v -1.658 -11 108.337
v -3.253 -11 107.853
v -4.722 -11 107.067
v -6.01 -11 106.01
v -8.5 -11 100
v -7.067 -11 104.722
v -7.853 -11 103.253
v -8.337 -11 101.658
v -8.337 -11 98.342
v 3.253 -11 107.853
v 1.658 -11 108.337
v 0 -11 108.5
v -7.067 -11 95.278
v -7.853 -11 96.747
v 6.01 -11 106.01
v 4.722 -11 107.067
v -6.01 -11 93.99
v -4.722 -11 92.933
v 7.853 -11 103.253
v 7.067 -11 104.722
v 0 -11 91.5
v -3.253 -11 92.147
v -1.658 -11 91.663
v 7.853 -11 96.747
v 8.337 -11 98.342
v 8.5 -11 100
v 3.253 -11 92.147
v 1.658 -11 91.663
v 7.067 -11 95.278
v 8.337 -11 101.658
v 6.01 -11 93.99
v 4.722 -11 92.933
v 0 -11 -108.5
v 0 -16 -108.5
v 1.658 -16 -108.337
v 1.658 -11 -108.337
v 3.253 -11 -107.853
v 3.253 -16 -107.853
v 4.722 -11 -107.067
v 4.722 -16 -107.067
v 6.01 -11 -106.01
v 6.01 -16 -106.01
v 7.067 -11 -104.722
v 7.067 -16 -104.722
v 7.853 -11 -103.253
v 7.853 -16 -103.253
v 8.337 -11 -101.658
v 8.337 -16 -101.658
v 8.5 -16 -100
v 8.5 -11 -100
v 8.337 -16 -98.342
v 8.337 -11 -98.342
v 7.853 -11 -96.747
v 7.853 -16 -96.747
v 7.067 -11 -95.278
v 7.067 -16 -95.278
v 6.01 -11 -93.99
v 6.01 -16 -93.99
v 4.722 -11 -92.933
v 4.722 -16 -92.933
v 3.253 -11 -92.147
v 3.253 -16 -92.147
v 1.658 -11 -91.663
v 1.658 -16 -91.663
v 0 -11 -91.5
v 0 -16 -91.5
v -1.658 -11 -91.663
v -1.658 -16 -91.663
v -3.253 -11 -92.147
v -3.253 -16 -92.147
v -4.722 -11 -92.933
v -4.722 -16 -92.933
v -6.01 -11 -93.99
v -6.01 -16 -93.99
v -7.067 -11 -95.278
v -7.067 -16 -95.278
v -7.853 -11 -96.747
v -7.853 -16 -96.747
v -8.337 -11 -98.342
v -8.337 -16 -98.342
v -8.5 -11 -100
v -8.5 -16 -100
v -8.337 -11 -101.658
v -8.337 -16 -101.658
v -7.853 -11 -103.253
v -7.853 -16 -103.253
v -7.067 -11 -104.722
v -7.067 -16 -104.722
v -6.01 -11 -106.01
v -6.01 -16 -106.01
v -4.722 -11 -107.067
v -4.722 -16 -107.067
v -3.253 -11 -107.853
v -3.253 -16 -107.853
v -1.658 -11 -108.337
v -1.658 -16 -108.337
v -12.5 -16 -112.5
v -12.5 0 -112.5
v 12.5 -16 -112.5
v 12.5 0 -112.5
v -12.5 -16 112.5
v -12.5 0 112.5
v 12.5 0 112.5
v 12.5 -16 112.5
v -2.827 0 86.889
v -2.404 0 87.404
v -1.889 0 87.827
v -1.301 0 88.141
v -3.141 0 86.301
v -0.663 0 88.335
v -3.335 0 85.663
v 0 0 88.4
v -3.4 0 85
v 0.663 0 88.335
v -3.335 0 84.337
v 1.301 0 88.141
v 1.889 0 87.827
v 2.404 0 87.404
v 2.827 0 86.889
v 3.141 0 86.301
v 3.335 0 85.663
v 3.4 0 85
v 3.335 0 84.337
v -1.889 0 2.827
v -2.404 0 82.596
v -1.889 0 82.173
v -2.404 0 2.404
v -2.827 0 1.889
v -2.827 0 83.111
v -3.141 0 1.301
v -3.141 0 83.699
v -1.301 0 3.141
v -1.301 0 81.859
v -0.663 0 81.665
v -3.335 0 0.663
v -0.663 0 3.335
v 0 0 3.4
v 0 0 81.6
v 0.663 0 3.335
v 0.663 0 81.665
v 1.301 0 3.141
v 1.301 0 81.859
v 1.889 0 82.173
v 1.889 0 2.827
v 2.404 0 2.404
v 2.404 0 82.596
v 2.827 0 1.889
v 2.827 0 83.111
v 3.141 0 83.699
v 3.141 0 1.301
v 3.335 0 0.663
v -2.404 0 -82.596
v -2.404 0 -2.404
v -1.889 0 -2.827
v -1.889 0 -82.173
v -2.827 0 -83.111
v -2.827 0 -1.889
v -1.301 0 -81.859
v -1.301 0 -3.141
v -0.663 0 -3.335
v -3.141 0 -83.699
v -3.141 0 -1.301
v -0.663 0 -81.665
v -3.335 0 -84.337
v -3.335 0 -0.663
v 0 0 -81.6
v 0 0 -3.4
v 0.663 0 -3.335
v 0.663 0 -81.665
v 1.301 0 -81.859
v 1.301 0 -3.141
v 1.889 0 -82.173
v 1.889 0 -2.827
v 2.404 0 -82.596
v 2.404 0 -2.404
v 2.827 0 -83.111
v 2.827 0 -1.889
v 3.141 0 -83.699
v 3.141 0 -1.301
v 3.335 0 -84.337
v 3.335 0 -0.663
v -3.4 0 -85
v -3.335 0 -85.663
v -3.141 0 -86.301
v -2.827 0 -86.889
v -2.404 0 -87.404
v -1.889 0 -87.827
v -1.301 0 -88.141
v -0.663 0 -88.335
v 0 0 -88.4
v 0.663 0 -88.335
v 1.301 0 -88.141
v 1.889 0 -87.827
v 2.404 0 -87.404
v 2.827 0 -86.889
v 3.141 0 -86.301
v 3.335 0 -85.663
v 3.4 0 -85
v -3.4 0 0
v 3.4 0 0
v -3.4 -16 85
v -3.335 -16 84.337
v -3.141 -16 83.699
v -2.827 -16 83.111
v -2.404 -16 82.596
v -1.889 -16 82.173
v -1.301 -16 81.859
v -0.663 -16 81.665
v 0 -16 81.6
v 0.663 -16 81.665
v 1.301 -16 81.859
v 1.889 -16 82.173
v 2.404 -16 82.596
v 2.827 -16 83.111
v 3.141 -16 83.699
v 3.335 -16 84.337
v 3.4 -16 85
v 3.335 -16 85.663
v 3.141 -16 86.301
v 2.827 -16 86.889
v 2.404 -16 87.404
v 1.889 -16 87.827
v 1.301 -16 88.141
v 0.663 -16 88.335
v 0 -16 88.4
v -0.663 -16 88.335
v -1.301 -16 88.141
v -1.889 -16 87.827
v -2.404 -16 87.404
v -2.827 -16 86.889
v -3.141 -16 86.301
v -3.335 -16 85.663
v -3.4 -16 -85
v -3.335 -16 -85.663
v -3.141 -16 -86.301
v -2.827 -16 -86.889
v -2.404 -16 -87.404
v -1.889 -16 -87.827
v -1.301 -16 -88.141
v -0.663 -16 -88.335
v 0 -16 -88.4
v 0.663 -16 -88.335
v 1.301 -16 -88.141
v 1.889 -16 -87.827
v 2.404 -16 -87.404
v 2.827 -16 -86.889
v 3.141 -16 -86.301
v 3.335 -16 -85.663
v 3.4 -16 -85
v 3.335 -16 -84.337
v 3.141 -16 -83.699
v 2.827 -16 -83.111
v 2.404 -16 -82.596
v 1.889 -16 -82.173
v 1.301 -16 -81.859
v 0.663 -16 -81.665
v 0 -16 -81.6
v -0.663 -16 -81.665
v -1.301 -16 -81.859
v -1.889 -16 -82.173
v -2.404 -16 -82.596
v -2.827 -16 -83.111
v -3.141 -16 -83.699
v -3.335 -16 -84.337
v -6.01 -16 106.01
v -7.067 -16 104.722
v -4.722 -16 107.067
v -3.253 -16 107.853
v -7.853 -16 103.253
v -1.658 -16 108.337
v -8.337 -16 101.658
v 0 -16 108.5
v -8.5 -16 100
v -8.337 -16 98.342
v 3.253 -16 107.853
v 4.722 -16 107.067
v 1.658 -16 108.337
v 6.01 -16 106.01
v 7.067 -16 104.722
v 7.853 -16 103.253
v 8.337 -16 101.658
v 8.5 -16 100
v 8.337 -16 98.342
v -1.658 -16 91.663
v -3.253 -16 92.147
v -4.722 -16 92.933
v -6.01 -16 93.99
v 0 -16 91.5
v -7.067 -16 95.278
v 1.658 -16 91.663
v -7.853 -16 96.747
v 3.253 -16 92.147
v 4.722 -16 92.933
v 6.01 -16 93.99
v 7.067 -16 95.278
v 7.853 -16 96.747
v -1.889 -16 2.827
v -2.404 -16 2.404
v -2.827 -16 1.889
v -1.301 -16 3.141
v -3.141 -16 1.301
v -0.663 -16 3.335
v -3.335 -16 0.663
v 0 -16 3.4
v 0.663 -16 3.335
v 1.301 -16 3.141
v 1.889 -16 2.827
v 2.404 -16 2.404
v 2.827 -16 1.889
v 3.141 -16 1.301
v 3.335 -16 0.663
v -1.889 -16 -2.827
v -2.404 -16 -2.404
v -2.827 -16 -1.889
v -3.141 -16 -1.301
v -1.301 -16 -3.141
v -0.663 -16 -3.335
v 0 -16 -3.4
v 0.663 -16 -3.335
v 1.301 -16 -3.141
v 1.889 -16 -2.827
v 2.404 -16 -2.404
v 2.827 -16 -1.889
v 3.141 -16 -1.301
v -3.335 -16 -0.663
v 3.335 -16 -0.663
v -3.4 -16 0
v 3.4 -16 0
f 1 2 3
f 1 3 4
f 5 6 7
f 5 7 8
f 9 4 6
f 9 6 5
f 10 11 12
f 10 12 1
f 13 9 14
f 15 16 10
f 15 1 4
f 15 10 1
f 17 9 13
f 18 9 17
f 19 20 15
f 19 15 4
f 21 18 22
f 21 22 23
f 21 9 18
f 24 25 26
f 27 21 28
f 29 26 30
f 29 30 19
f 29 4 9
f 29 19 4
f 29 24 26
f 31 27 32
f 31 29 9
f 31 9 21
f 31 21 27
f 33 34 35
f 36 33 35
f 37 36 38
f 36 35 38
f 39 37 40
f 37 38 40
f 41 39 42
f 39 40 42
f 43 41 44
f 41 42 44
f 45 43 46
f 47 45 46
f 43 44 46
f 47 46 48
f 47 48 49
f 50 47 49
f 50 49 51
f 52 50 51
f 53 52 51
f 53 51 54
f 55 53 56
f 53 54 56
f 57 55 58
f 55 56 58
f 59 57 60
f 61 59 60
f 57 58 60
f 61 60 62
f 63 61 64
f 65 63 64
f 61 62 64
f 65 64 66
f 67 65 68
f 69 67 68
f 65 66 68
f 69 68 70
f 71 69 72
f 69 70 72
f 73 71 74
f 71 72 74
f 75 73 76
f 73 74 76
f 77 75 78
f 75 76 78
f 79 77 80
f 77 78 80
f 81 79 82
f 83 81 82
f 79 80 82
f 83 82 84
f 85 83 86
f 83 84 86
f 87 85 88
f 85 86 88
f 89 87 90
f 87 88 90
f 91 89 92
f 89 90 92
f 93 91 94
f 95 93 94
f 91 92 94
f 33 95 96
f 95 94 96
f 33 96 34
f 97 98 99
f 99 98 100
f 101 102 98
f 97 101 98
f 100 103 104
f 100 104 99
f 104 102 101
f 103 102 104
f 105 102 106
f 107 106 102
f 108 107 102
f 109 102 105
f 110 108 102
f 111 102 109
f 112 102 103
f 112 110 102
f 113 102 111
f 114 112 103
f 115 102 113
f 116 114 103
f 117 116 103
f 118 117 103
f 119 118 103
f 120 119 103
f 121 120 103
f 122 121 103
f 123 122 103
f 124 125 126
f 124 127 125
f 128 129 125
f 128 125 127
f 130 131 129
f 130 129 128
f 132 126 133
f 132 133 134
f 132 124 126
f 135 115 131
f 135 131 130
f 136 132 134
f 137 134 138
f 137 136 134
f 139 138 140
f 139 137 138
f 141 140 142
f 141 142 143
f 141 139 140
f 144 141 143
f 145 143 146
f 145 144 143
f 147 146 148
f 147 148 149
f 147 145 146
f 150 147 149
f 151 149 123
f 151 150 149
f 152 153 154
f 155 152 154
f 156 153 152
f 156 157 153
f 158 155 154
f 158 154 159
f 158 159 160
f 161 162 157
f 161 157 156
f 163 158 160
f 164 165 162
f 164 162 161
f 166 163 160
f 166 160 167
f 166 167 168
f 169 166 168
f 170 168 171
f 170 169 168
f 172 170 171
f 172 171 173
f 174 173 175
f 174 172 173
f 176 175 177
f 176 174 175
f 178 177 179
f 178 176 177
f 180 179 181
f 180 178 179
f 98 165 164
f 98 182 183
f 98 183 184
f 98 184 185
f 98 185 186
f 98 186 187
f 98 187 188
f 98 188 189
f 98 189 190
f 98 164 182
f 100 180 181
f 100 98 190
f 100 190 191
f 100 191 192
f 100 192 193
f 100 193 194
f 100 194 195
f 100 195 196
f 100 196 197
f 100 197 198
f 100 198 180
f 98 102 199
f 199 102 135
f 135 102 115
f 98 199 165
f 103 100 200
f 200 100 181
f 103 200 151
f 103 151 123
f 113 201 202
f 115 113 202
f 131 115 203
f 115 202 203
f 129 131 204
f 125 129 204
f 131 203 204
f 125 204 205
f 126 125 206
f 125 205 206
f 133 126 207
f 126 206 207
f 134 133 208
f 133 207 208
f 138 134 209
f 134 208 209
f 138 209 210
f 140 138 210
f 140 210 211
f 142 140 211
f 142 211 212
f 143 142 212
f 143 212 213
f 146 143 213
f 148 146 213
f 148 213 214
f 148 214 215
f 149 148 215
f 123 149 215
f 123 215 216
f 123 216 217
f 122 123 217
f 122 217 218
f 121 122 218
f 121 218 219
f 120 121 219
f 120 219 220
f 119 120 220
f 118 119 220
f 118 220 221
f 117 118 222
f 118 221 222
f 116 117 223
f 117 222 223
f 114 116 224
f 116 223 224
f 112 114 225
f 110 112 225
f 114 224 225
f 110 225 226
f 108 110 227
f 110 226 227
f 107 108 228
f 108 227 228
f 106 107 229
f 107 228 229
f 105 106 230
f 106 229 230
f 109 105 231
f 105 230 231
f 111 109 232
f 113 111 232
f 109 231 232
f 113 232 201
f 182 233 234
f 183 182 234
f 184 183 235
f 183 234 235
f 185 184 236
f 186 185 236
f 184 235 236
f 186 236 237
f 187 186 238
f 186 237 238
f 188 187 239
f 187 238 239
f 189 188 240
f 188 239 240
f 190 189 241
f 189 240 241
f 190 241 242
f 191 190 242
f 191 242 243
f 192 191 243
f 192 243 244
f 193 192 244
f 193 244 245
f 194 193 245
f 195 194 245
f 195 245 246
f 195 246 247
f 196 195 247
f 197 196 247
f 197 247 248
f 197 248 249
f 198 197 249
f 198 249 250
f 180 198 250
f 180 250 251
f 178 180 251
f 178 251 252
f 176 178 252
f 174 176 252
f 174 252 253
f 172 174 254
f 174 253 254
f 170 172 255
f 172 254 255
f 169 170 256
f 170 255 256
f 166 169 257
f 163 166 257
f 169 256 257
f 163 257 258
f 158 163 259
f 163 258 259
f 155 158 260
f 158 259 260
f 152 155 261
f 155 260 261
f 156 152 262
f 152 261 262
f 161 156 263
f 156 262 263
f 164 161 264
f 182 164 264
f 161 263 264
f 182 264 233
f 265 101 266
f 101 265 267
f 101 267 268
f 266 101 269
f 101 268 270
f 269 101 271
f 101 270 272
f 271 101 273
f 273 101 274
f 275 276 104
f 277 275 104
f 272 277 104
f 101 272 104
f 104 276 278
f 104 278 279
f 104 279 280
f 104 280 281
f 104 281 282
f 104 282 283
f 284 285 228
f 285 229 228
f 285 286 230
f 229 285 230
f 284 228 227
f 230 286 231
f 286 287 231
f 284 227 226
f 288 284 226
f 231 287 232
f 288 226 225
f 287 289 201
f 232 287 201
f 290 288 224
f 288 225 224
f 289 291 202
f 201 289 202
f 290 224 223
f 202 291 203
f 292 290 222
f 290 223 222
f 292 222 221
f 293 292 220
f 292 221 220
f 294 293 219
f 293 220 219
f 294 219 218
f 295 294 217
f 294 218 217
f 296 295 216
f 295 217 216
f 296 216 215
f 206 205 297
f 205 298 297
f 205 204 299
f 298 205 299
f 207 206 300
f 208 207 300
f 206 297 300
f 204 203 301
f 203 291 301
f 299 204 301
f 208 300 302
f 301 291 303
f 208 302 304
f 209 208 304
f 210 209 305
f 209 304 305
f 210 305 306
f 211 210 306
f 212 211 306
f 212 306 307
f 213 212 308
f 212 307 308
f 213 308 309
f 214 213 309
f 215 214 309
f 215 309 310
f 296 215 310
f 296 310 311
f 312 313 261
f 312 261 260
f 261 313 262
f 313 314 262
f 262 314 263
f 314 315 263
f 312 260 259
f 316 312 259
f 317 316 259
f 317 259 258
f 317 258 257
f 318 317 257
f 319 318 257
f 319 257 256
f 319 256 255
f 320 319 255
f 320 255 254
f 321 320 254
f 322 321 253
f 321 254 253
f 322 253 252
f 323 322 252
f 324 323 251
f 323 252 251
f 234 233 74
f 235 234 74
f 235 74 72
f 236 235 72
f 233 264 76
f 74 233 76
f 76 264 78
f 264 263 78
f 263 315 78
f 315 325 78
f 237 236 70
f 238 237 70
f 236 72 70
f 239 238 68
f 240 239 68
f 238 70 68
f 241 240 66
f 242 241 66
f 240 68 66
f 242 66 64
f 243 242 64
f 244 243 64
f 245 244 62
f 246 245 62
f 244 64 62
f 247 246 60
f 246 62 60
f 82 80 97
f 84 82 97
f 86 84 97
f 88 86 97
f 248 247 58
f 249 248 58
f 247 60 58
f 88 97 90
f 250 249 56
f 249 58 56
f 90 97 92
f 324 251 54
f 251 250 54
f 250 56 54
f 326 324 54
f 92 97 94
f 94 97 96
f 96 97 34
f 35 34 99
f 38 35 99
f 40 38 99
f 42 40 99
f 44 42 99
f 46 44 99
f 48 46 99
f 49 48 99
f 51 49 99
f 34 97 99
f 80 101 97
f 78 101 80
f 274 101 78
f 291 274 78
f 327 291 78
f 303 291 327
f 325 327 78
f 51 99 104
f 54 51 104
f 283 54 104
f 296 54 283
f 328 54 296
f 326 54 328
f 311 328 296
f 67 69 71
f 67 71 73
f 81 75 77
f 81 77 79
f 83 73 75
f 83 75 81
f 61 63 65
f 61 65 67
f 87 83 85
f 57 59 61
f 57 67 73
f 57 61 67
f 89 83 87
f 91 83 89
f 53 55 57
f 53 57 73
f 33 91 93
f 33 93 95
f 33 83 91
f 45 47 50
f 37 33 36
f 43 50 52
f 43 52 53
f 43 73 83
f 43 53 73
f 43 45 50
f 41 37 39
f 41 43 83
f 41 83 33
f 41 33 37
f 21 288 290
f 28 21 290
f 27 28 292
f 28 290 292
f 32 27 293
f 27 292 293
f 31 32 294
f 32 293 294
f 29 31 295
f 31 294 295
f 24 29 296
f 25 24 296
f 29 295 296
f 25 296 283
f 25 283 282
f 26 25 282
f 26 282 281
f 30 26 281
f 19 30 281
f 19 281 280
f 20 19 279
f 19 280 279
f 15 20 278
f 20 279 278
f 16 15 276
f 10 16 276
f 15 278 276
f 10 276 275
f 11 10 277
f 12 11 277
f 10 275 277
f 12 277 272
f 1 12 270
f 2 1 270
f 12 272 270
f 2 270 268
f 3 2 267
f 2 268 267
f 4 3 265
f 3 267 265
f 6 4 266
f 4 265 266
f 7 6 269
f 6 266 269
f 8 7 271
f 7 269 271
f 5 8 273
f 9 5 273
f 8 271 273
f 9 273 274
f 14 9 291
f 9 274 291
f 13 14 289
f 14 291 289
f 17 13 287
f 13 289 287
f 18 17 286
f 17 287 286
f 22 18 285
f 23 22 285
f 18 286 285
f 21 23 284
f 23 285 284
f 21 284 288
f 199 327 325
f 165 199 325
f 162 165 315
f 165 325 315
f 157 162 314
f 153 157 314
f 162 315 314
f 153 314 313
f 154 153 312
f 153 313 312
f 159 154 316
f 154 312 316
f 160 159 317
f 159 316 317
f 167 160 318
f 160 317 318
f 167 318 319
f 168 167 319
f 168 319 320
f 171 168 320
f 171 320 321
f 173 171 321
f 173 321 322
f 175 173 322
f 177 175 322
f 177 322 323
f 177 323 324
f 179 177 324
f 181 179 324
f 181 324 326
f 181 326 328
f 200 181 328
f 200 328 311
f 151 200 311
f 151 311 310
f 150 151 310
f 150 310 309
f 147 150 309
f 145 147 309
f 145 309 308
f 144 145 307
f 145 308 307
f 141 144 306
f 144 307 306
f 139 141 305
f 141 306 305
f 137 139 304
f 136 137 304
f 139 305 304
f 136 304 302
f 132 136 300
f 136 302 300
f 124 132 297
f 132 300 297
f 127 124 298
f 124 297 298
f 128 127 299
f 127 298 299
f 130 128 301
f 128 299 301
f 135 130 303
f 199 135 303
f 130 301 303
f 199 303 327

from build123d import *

# Parameters (mm, degrees)
SKETCH1_W           = 25
SKETCH1_H           = 225
BOSS_EXTRUDE1_DEPTH = 16
SKETCH2_R           = 8.5
CUT_EXTRUDE1_DEPTH  = 5
M8_TAPPED_HOLE1_D   = 6.8


with BuildPart() as part:
    # Sketch1 → Boss-Extrude1 (new body)
    with BuildSketch(Plane(origin=(0, 0, 0), x_dir=(1, 0, 0), z_dir=(0, 1, 0))):
        Rectangle(SKETCH1_W, SKETCH1_H)
    extrude(amount=-BOSS_EXTRUDE1_DEPTH)

    # Sketch2 → Cut-Extrude1 (cut)
    with BuildSketch(Plane.XZ.offset(16)):
        with Locations(Location((0, 100, 0), (0, 0, 270))):
            Circle(SKETCH2_R)
        with Locations(Location((0, -100, 0), (0, 0, 270))):
            Circle(SKETCH2_R)
    extrude(amount=-CUT_EXTRUDE1_DEPTH, mode=Mode.SUBTRACT)

    # M8 Tapped Hole1 (through all)
    with Locations(Plane(origin=(0, 0, 0), x_dir=(1, 0, 0), z_dir=(0, 1, 0))):
        with Locations((0, 85), (0, 0), (0, -85)):
            Hole(M8_TAPPED_HOLE1_D / 2)


solid = part.part
